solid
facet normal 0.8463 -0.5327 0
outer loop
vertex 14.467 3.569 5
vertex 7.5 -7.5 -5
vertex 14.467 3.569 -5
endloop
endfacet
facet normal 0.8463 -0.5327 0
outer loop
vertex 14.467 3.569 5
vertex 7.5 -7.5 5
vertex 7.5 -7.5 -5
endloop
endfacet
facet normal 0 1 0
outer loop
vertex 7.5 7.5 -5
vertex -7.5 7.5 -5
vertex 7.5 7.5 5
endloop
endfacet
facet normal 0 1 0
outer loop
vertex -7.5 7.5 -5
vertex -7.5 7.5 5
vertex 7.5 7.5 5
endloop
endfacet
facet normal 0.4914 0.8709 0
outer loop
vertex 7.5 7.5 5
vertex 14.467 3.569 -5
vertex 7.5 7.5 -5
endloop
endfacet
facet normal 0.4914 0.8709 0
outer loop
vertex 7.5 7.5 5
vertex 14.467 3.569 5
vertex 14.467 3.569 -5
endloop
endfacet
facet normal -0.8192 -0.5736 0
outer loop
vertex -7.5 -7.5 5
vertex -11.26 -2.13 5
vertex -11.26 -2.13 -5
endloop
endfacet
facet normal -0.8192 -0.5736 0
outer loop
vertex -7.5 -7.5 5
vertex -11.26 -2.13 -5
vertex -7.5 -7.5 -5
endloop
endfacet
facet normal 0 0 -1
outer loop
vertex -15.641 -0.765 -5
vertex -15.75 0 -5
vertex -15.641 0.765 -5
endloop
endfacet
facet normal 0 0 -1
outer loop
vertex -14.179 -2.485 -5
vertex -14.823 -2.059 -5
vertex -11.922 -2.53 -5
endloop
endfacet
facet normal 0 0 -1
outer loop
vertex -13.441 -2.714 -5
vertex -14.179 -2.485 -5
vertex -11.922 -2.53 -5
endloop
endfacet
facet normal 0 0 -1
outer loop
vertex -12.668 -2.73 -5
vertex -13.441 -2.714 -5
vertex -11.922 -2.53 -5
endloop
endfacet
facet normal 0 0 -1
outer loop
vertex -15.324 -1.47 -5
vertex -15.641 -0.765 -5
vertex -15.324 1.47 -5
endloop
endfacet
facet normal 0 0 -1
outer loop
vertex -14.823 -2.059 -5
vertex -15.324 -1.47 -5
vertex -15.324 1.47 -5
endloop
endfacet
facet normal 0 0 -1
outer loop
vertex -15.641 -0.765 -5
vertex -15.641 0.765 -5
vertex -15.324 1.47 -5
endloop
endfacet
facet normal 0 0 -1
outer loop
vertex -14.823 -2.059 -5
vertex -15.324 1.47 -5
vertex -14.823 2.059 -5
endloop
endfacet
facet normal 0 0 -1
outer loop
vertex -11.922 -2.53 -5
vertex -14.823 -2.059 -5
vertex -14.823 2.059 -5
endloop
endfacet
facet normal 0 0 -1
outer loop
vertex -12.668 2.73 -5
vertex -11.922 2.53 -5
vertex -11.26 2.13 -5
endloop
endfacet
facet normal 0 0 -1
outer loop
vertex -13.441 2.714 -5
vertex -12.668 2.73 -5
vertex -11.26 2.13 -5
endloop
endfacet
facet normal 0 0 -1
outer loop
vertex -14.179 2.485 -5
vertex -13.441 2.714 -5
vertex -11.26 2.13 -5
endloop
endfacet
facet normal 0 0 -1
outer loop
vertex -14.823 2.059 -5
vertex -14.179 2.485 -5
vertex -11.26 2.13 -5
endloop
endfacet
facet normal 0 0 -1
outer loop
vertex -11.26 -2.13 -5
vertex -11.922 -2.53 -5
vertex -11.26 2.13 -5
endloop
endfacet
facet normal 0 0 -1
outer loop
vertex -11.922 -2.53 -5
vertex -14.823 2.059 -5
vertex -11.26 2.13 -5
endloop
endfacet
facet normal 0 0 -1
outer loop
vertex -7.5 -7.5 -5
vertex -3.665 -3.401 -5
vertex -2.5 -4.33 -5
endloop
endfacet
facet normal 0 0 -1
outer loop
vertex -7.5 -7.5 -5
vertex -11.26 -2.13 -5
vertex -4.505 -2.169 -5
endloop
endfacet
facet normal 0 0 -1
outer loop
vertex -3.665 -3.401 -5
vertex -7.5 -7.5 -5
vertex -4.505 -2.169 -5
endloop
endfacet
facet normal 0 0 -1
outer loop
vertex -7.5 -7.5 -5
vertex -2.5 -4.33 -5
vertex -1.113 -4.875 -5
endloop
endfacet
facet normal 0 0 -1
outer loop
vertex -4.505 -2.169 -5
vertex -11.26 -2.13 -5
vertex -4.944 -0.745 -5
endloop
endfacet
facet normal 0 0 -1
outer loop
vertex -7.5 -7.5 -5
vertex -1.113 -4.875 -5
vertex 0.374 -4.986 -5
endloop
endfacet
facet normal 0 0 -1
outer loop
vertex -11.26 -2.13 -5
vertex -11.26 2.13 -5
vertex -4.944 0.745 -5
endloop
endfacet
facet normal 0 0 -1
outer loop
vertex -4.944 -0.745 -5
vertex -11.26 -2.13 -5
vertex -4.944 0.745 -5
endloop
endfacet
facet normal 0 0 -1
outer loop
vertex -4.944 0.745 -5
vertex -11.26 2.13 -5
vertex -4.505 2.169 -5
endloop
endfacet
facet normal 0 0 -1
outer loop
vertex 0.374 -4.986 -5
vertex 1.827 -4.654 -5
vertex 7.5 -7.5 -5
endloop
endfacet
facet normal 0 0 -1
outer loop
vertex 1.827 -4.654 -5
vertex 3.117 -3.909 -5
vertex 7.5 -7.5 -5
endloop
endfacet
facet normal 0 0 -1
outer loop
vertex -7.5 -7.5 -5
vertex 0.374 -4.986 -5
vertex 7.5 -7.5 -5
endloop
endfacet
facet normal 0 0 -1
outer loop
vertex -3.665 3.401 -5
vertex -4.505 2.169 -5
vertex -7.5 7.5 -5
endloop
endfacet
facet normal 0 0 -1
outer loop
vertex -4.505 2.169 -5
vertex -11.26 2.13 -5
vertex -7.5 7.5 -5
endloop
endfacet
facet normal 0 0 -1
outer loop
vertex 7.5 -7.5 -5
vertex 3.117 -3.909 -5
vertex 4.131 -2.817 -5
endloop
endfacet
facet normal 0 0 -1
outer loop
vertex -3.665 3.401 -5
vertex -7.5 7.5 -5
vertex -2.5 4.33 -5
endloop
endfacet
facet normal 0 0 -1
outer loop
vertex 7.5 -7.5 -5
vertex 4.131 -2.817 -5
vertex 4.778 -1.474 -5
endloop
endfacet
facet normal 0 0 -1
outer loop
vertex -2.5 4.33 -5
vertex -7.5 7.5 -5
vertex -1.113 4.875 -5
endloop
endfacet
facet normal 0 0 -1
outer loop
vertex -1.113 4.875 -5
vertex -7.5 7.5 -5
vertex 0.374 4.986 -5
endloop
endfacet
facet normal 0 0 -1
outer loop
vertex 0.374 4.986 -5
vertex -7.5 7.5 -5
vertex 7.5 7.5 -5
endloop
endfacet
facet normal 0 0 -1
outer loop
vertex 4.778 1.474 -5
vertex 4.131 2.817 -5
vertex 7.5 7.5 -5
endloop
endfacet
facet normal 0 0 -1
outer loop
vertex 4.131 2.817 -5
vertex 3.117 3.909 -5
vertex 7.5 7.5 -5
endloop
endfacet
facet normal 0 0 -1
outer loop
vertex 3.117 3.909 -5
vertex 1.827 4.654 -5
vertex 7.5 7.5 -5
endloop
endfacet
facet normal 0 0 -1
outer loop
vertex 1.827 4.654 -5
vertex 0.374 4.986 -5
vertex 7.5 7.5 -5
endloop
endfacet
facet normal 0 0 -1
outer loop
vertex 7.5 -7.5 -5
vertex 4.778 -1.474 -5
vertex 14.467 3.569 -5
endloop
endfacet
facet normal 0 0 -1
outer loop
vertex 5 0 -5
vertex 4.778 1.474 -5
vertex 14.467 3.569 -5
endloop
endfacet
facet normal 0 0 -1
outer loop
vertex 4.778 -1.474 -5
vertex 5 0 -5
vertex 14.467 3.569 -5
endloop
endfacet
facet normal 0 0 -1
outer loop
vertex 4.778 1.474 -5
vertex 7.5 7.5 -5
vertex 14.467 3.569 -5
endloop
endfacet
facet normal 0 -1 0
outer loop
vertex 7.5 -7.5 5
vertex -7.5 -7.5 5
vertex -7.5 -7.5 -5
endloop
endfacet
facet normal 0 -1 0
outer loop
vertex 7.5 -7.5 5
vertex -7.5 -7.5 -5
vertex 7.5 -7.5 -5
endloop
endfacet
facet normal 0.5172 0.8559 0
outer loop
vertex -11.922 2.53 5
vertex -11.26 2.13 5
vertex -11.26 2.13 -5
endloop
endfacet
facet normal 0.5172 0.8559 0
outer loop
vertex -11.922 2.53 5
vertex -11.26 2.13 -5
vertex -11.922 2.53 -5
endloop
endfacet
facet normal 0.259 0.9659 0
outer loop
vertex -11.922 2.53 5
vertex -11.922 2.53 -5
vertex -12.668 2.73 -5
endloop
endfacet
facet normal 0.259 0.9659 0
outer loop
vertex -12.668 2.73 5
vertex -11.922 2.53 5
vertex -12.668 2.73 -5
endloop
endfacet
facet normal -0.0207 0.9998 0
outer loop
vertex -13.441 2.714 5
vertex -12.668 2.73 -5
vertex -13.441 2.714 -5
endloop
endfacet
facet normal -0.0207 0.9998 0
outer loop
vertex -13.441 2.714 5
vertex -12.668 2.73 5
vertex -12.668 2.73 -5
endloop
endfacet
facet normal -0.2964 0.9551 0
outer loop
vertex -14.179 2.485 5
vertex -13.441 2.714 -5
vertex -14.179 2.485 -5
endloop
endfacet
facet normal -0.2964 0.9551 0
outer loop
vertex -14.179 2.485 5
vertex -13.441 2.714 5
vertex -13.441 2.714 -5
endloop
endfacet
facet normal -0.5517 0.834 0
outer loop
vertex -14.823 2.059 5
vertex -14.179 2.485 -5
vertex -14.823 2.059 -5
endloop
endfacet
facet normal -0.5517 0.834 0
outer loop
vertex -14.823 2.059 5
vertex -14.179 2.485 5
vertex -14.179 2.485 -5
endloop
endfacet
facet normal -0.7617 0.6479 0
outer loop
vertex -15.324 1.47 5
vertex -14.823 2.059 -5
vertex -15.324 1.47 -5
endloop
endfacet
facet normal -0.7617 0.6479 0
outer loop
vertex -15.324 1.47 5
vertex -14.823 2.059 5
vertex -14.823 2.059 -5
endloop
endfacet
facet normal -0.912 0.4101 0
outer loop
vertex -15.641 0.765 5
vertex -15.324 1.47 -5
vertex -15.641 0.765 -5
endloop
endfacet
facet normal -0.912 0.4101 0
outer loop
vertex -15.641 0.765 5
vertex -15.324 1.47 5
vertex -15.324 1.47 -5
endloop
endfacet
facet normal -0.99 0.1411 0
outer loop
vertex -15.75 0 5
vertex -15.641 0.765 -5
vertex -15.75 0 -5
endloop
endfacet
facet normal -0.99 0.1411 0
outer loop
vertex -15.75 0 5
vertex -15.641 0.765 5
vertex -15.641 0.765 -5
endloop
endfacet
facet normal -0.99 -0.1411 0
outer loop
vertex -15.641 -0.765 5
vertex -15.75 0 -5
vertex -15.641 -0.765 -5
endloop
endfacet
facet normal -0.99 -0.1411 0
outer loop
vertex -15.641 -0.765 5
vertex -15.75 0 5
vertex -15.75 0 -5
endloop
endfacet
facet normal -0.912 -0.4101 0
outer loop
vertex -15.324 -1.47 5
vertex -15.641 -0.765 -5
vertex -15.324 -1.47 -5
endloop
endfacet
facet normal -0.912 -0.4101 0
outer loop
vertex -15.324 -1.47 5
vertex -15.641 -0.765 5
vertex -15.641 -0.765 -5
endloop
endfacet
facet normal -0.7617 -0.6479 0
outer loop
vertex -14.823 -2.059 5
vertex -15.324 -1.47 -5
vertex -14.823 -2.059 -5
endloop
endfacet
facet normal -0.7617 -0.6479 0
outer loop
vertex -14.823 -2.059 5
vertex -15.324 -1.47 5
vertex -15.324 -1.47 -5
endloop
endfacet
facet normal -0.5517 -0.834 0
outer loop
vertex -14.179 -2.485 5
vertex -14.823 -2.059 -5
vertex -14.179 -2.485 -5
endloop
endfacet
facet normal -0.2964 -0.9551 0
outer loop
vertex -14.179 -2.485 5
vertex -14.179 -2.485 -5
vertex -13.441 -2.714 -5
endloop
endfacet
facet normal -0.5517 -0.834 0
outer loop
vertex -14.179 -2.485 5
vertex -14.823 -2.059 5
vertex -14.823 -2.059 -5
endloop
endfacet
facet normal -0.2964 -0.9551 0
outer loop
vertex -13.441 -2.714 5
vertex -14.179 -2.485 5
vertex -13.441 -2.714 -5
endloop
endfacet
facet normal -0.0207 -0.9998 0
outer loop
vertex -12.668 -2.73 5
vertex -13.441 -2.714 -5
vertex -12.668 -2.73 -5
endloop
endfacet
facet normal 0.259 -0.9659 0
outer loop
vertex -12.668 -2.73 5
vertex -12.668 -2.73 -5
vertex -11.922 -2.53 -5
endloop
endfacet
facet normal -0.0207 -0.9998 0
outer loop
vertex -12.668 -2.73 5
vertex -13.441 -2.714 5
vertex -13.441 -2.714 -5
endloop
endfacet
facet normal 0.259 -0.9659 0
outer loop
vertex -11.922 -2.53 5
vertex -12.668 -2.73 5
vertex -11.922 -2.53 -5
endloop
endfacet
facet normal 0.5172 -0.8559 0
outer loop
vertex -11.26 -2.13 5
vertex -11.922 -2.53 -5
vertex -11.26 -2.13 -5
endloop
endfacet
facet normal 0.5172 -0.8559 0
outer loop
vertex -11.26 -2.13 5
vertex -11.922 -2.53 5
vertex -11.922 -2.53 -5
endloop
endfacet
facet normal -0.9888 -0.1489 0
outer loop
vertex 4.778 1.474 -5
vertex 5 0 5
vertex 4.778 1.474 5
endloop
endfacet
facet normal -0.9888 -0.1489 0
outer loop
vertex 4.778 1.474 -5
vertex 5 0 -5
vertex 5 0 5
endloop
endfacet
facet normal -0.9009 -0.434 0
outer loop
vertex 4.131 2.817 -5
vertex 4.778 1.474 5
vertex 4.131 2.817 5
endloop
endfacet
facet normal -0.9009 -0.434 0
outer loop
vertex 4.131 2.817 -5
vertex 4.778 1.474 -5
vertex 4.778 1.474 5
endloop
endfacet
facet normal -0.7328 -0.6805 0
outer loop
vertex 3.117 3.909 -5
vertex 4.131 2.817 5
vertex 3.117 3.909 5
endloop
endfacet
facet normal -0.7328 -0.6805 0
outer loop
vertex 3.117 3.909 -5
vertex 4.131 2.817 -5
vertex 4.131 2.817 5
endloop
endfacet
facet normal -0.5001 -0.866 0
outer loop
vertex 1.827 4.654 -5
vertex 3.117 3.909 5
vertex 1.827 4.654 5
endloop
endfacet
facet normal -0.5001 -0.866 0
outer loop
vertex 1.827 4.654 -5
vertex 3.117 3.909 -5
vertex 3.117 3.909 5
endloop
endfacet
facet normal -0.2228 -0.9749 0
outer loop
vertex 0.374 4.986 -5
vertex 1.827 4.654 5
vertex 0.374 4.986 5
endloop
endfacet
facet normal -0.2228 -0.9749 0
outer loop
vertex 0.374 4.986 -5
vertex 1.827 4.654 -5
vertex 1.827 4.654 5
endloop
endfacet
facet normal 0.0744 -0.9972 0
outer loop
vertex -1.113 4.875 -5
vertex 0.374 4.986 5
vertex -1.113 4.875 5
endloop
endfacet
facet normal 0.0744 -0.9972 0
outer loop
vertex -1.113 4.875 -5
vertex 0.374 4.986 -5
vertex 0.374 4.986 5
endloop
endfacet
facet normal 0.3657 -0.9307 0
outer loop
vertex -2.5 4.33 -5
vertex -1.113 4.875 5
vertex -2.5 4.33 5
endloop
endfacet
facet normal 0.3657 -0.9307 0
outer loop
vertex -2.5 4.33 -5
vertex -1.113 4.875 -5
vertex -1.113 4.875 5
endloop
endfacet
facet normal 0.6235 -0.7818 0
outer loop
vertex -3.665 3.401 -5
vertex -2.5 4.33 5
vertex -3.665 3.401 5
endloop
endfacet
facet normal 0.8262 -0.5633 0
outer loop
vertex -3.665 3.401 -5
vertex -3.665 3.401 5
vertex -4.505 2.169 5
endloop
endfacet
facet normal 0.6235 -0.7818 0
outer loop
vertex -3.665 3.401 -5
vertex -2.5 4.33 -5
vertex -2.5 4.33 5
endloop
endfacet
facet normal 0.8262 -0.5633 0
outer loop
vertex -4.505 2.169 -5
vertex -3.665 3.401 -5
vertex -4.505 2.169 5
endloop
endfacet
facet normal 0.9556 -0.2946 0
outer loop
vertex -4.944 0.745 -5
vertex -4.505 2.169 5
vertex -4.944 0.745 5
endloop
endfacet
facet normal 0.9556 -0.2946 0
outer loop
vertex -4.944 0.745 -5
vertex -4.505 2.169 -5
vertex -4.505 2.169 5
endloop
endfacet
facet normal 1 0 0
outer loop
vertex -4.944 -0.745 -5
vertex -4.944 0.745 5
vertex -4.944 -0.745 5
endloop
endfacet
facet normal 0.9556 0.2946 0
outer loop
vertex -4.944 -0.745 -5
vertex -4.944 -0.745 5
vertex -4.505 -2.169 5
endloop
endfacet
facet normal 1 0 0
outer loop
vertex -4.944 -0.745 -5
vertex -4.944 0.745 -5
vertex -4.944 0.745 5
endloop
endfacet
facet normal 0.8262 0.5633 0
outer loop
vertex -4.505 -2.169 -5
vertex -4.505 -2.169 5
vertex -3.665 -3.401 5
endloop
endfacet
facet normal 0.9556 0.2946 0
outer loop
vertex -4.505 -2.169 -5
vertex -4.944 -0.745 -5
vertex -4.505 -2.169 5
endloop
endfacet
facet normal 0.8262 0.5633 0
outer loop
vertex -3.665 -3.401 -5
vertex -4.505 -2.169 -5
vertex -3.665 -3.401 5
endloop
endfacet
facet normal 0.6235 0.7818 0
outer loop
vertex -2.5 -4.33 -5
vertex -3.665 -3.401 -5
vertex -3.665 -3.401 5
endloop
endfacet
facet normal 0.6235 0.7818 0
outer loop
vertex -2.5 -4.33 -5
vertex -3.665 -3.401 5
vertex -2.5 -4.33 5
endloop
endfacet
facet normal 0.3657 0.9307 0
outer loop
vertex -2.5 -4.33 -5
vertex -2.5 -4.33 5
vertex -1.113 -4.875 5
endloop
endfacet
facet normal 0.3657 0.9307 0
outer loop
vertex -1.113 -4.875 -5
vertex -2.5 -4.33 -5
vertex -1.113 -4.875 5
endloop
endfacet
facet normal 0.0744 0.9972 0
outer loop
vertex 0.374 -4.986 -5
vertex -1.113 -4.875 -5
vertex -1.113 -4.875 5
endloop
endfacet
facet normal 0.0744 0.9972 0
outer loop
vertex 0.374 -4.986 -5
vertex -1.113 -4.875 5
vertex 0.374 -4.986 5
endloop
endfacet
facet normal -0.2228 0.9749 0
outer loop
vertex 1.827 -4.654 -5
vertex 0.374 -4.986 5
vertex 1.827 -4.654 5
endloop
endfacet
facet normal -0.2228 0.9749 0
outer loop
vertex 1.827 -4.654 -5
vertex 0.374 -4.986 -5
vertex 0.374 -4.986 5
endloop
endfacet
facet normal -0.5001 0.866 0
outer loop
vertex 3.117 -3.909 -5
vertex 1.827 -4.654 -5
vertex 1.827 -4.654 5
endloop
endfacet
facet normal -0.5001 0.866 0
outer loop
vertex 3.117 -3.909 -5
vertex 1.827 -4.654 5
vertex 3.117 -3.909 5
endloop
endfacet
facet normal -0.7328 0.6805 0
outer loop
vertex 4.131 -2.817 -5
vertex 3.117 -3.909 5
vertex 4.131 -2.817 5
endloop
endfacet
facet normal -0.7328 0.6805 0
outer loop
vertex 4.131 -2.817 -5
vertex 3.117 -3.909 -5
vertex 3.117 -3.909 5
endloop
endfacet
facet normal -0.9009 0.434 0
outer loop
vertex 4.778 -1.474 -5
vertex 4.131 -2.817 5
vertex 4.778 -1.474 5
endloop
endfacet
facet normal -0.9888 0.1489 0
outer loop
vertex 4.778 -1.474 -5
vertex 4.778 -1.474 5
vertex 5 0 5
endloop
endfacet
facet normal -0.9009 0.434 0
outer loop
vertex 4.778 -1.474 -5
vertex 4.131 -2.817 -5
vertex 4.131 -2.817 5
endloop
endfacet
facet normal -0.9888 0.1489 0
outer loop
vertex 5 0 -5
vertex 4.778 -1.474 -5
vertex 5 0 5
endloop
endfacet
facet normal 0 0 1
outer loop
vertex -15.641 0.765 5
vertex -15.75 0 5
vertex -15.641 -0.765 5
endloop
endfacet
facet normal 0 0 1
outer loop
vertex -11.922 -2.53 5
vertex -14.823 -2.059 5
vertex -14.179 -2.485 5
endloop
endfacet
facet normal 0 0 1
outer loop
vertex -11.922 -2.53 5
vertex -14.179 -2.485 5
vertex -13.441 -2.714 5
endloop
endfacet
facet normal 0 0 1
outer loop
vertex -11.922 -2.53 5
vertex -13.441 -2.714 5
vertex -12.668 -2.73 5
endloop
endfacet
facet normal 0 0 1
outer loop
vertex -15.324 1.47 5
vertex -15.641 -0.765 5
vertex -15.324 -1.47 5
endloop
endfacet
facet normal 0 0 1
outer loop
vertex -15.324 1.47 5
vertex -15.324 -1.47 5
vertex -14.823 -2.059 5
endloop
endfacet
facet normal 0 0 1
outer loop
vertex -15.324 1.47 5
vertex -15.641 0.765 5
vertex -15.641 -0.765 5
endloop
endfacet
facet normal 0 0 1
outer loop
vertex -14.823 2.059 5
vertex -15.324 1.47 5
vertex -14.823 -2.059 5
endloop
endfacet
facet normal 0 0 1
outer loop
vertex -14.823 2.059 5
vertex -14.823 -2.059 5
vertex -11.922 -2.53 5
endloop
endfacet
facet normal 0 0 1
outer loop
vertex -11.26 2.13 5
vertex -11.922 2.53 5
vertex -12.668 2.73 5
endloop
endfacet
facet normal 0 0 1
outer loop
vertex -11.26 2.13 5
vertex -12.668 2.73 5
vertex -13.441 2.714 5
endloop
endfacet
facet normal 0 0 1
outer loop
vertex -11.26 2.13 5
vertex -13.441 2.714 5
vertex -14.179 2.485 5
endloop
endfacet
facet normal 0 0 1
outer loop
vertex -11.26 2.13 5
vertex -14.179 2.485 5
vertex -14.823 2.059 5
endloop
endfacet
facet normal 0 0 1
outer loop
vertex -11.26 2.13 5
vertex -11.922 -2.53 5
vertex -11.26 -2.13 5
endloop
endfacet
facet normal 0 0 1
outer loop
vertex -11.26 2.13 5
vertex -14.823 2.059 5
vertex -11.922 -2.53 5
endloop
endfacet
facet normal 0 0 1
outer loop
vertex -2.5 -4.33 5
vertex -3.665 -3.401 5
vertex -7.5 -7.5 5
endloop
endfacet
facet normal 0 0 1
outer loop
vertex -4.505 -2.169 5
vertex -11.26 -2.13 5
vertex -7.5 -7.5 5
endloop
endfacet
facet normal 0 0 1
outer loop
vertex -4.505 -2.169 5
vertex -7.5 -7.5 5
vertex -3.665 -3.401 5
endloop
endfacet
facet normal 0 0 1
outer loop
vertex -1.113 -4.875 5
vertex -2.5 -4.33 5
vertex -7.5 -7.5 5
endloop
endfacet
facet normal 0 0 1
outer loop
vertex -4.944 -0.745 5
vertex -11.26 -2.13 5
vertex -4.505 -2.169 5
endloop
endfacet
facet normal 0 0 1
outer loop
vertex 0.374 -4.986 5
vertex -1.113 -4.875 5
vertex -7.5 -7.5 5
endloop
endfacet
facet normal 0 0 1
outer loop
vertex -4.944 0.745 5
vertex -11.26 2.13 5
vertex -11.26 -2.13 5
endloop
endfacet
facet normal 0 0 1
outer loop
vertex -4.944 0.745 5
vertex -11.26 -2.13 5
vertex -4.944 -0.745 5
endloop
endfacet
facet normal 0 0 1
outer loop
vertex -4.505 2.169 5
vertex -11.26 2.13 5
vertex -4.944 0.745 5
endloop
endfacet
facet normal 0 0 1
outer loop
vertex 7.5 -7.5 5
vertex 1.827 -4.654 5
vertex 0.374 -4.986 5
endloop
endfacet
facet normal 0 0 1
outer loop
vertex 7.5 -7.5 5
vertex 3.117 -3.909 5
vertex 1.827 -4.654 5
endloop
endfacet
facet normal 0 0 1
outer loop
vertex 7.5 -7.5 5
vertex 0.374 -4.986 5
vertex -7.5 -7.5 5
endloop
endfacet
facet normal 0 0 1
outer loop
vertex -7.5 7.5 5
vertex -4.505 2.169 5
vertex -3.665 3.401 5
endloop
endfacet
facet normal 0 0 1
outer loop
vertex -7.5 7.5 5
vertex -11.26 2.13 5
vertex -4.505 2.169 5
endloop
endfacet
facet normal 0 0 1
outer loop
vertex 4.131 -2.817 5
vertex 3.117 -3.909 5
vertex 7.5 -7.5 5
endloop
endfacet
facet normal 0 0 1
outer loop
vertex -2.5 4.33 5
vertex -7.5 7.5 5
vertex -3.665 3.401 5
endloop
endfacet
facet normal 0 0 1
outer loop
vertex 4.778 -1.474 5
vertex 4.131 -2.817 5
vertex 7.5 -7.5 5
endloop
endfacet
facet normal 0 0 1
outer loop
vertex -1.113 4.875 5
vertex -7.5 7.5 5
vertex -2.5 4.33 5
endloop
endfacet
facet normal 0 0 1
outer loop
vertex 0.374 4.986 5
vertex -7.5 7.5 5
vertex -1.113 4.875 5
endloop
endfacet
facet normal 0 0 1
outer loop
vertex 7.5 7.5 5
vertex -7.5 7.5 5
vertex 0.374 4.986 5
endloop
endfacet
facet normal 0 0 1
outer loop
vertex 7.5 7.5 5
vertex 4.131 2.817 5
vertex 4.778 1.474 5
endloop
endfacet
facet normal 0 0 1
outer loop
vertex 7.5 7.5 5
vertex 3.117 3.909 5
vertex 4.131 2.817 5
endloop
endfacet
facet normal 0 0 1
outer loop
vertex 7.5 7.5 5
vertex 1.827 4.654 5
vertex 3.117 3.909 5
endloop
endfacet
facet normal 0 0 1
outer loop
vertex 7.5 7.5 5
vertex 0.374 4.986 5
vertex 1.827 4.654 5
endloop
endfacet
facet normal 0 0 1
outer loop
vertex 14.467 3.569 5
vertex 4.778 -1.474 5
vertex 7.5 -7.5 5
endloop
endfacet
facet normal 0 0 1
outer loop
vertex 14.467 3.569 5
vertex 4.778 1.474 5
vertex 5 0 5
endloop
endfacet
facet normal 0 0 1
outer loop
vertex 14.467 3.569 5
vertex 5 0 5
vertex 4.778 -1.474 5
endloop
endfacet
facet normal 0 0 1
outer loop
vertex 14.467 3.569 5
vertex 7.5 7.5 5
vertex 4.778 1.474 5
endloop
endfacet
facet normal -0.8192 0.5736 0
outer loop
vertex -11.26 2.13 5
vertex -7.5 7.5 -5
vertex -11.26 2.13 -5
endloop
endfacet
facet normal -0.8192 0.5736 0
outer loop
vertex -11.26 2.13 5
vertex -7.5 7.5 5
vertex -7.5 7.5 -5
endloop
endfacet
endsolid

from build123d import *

# Parameters (mm, degrees)
F0_W     = 15
F0_H     = 15
F0_R     = 5
F1_DEPTH = 5
F3_DEPTH = 5
F5_DEPTH = 5


with BuildPart() as f1:
    # F0 (on Top) → F1 (new body, symmetric)
    with BuildSketch(Plane.XY):
        Rectangle(F0_W, F0_H)
        Circle(F0_R, mode=Mode.SUBTRACT)
    extrude(amount=F1_DEPTH, both=True)

    # F2 (on Top) → F3 (join, symmetric)
    with BuildSketch(Plane.XY):
        with BuildLine():
            Line((-7.5, 7.5), (-11.260282, 2.129761))
            ThreePointArc((-11.260282, 2.129761), (-15.75, 0), (-11.260282, -2.129761))
            Line((-11.260282, -2.129761), (-7.5, -7.5))
            Line((-7.5, -7.5), (-7.5, 7.5))
        make_face()
    extrude(amount=F3_DEPTH, both=True)

    # F4 (on Top) → F5 (join, symmetric)
    with BuildSketch(Plane.XY):
        Polygon((14.467447, 3.568756), (7.5, 7.5), (7.5, -7.5), align=None)
    extrude(amount=F5_DEPTH, both=True)


solid = f1.part
